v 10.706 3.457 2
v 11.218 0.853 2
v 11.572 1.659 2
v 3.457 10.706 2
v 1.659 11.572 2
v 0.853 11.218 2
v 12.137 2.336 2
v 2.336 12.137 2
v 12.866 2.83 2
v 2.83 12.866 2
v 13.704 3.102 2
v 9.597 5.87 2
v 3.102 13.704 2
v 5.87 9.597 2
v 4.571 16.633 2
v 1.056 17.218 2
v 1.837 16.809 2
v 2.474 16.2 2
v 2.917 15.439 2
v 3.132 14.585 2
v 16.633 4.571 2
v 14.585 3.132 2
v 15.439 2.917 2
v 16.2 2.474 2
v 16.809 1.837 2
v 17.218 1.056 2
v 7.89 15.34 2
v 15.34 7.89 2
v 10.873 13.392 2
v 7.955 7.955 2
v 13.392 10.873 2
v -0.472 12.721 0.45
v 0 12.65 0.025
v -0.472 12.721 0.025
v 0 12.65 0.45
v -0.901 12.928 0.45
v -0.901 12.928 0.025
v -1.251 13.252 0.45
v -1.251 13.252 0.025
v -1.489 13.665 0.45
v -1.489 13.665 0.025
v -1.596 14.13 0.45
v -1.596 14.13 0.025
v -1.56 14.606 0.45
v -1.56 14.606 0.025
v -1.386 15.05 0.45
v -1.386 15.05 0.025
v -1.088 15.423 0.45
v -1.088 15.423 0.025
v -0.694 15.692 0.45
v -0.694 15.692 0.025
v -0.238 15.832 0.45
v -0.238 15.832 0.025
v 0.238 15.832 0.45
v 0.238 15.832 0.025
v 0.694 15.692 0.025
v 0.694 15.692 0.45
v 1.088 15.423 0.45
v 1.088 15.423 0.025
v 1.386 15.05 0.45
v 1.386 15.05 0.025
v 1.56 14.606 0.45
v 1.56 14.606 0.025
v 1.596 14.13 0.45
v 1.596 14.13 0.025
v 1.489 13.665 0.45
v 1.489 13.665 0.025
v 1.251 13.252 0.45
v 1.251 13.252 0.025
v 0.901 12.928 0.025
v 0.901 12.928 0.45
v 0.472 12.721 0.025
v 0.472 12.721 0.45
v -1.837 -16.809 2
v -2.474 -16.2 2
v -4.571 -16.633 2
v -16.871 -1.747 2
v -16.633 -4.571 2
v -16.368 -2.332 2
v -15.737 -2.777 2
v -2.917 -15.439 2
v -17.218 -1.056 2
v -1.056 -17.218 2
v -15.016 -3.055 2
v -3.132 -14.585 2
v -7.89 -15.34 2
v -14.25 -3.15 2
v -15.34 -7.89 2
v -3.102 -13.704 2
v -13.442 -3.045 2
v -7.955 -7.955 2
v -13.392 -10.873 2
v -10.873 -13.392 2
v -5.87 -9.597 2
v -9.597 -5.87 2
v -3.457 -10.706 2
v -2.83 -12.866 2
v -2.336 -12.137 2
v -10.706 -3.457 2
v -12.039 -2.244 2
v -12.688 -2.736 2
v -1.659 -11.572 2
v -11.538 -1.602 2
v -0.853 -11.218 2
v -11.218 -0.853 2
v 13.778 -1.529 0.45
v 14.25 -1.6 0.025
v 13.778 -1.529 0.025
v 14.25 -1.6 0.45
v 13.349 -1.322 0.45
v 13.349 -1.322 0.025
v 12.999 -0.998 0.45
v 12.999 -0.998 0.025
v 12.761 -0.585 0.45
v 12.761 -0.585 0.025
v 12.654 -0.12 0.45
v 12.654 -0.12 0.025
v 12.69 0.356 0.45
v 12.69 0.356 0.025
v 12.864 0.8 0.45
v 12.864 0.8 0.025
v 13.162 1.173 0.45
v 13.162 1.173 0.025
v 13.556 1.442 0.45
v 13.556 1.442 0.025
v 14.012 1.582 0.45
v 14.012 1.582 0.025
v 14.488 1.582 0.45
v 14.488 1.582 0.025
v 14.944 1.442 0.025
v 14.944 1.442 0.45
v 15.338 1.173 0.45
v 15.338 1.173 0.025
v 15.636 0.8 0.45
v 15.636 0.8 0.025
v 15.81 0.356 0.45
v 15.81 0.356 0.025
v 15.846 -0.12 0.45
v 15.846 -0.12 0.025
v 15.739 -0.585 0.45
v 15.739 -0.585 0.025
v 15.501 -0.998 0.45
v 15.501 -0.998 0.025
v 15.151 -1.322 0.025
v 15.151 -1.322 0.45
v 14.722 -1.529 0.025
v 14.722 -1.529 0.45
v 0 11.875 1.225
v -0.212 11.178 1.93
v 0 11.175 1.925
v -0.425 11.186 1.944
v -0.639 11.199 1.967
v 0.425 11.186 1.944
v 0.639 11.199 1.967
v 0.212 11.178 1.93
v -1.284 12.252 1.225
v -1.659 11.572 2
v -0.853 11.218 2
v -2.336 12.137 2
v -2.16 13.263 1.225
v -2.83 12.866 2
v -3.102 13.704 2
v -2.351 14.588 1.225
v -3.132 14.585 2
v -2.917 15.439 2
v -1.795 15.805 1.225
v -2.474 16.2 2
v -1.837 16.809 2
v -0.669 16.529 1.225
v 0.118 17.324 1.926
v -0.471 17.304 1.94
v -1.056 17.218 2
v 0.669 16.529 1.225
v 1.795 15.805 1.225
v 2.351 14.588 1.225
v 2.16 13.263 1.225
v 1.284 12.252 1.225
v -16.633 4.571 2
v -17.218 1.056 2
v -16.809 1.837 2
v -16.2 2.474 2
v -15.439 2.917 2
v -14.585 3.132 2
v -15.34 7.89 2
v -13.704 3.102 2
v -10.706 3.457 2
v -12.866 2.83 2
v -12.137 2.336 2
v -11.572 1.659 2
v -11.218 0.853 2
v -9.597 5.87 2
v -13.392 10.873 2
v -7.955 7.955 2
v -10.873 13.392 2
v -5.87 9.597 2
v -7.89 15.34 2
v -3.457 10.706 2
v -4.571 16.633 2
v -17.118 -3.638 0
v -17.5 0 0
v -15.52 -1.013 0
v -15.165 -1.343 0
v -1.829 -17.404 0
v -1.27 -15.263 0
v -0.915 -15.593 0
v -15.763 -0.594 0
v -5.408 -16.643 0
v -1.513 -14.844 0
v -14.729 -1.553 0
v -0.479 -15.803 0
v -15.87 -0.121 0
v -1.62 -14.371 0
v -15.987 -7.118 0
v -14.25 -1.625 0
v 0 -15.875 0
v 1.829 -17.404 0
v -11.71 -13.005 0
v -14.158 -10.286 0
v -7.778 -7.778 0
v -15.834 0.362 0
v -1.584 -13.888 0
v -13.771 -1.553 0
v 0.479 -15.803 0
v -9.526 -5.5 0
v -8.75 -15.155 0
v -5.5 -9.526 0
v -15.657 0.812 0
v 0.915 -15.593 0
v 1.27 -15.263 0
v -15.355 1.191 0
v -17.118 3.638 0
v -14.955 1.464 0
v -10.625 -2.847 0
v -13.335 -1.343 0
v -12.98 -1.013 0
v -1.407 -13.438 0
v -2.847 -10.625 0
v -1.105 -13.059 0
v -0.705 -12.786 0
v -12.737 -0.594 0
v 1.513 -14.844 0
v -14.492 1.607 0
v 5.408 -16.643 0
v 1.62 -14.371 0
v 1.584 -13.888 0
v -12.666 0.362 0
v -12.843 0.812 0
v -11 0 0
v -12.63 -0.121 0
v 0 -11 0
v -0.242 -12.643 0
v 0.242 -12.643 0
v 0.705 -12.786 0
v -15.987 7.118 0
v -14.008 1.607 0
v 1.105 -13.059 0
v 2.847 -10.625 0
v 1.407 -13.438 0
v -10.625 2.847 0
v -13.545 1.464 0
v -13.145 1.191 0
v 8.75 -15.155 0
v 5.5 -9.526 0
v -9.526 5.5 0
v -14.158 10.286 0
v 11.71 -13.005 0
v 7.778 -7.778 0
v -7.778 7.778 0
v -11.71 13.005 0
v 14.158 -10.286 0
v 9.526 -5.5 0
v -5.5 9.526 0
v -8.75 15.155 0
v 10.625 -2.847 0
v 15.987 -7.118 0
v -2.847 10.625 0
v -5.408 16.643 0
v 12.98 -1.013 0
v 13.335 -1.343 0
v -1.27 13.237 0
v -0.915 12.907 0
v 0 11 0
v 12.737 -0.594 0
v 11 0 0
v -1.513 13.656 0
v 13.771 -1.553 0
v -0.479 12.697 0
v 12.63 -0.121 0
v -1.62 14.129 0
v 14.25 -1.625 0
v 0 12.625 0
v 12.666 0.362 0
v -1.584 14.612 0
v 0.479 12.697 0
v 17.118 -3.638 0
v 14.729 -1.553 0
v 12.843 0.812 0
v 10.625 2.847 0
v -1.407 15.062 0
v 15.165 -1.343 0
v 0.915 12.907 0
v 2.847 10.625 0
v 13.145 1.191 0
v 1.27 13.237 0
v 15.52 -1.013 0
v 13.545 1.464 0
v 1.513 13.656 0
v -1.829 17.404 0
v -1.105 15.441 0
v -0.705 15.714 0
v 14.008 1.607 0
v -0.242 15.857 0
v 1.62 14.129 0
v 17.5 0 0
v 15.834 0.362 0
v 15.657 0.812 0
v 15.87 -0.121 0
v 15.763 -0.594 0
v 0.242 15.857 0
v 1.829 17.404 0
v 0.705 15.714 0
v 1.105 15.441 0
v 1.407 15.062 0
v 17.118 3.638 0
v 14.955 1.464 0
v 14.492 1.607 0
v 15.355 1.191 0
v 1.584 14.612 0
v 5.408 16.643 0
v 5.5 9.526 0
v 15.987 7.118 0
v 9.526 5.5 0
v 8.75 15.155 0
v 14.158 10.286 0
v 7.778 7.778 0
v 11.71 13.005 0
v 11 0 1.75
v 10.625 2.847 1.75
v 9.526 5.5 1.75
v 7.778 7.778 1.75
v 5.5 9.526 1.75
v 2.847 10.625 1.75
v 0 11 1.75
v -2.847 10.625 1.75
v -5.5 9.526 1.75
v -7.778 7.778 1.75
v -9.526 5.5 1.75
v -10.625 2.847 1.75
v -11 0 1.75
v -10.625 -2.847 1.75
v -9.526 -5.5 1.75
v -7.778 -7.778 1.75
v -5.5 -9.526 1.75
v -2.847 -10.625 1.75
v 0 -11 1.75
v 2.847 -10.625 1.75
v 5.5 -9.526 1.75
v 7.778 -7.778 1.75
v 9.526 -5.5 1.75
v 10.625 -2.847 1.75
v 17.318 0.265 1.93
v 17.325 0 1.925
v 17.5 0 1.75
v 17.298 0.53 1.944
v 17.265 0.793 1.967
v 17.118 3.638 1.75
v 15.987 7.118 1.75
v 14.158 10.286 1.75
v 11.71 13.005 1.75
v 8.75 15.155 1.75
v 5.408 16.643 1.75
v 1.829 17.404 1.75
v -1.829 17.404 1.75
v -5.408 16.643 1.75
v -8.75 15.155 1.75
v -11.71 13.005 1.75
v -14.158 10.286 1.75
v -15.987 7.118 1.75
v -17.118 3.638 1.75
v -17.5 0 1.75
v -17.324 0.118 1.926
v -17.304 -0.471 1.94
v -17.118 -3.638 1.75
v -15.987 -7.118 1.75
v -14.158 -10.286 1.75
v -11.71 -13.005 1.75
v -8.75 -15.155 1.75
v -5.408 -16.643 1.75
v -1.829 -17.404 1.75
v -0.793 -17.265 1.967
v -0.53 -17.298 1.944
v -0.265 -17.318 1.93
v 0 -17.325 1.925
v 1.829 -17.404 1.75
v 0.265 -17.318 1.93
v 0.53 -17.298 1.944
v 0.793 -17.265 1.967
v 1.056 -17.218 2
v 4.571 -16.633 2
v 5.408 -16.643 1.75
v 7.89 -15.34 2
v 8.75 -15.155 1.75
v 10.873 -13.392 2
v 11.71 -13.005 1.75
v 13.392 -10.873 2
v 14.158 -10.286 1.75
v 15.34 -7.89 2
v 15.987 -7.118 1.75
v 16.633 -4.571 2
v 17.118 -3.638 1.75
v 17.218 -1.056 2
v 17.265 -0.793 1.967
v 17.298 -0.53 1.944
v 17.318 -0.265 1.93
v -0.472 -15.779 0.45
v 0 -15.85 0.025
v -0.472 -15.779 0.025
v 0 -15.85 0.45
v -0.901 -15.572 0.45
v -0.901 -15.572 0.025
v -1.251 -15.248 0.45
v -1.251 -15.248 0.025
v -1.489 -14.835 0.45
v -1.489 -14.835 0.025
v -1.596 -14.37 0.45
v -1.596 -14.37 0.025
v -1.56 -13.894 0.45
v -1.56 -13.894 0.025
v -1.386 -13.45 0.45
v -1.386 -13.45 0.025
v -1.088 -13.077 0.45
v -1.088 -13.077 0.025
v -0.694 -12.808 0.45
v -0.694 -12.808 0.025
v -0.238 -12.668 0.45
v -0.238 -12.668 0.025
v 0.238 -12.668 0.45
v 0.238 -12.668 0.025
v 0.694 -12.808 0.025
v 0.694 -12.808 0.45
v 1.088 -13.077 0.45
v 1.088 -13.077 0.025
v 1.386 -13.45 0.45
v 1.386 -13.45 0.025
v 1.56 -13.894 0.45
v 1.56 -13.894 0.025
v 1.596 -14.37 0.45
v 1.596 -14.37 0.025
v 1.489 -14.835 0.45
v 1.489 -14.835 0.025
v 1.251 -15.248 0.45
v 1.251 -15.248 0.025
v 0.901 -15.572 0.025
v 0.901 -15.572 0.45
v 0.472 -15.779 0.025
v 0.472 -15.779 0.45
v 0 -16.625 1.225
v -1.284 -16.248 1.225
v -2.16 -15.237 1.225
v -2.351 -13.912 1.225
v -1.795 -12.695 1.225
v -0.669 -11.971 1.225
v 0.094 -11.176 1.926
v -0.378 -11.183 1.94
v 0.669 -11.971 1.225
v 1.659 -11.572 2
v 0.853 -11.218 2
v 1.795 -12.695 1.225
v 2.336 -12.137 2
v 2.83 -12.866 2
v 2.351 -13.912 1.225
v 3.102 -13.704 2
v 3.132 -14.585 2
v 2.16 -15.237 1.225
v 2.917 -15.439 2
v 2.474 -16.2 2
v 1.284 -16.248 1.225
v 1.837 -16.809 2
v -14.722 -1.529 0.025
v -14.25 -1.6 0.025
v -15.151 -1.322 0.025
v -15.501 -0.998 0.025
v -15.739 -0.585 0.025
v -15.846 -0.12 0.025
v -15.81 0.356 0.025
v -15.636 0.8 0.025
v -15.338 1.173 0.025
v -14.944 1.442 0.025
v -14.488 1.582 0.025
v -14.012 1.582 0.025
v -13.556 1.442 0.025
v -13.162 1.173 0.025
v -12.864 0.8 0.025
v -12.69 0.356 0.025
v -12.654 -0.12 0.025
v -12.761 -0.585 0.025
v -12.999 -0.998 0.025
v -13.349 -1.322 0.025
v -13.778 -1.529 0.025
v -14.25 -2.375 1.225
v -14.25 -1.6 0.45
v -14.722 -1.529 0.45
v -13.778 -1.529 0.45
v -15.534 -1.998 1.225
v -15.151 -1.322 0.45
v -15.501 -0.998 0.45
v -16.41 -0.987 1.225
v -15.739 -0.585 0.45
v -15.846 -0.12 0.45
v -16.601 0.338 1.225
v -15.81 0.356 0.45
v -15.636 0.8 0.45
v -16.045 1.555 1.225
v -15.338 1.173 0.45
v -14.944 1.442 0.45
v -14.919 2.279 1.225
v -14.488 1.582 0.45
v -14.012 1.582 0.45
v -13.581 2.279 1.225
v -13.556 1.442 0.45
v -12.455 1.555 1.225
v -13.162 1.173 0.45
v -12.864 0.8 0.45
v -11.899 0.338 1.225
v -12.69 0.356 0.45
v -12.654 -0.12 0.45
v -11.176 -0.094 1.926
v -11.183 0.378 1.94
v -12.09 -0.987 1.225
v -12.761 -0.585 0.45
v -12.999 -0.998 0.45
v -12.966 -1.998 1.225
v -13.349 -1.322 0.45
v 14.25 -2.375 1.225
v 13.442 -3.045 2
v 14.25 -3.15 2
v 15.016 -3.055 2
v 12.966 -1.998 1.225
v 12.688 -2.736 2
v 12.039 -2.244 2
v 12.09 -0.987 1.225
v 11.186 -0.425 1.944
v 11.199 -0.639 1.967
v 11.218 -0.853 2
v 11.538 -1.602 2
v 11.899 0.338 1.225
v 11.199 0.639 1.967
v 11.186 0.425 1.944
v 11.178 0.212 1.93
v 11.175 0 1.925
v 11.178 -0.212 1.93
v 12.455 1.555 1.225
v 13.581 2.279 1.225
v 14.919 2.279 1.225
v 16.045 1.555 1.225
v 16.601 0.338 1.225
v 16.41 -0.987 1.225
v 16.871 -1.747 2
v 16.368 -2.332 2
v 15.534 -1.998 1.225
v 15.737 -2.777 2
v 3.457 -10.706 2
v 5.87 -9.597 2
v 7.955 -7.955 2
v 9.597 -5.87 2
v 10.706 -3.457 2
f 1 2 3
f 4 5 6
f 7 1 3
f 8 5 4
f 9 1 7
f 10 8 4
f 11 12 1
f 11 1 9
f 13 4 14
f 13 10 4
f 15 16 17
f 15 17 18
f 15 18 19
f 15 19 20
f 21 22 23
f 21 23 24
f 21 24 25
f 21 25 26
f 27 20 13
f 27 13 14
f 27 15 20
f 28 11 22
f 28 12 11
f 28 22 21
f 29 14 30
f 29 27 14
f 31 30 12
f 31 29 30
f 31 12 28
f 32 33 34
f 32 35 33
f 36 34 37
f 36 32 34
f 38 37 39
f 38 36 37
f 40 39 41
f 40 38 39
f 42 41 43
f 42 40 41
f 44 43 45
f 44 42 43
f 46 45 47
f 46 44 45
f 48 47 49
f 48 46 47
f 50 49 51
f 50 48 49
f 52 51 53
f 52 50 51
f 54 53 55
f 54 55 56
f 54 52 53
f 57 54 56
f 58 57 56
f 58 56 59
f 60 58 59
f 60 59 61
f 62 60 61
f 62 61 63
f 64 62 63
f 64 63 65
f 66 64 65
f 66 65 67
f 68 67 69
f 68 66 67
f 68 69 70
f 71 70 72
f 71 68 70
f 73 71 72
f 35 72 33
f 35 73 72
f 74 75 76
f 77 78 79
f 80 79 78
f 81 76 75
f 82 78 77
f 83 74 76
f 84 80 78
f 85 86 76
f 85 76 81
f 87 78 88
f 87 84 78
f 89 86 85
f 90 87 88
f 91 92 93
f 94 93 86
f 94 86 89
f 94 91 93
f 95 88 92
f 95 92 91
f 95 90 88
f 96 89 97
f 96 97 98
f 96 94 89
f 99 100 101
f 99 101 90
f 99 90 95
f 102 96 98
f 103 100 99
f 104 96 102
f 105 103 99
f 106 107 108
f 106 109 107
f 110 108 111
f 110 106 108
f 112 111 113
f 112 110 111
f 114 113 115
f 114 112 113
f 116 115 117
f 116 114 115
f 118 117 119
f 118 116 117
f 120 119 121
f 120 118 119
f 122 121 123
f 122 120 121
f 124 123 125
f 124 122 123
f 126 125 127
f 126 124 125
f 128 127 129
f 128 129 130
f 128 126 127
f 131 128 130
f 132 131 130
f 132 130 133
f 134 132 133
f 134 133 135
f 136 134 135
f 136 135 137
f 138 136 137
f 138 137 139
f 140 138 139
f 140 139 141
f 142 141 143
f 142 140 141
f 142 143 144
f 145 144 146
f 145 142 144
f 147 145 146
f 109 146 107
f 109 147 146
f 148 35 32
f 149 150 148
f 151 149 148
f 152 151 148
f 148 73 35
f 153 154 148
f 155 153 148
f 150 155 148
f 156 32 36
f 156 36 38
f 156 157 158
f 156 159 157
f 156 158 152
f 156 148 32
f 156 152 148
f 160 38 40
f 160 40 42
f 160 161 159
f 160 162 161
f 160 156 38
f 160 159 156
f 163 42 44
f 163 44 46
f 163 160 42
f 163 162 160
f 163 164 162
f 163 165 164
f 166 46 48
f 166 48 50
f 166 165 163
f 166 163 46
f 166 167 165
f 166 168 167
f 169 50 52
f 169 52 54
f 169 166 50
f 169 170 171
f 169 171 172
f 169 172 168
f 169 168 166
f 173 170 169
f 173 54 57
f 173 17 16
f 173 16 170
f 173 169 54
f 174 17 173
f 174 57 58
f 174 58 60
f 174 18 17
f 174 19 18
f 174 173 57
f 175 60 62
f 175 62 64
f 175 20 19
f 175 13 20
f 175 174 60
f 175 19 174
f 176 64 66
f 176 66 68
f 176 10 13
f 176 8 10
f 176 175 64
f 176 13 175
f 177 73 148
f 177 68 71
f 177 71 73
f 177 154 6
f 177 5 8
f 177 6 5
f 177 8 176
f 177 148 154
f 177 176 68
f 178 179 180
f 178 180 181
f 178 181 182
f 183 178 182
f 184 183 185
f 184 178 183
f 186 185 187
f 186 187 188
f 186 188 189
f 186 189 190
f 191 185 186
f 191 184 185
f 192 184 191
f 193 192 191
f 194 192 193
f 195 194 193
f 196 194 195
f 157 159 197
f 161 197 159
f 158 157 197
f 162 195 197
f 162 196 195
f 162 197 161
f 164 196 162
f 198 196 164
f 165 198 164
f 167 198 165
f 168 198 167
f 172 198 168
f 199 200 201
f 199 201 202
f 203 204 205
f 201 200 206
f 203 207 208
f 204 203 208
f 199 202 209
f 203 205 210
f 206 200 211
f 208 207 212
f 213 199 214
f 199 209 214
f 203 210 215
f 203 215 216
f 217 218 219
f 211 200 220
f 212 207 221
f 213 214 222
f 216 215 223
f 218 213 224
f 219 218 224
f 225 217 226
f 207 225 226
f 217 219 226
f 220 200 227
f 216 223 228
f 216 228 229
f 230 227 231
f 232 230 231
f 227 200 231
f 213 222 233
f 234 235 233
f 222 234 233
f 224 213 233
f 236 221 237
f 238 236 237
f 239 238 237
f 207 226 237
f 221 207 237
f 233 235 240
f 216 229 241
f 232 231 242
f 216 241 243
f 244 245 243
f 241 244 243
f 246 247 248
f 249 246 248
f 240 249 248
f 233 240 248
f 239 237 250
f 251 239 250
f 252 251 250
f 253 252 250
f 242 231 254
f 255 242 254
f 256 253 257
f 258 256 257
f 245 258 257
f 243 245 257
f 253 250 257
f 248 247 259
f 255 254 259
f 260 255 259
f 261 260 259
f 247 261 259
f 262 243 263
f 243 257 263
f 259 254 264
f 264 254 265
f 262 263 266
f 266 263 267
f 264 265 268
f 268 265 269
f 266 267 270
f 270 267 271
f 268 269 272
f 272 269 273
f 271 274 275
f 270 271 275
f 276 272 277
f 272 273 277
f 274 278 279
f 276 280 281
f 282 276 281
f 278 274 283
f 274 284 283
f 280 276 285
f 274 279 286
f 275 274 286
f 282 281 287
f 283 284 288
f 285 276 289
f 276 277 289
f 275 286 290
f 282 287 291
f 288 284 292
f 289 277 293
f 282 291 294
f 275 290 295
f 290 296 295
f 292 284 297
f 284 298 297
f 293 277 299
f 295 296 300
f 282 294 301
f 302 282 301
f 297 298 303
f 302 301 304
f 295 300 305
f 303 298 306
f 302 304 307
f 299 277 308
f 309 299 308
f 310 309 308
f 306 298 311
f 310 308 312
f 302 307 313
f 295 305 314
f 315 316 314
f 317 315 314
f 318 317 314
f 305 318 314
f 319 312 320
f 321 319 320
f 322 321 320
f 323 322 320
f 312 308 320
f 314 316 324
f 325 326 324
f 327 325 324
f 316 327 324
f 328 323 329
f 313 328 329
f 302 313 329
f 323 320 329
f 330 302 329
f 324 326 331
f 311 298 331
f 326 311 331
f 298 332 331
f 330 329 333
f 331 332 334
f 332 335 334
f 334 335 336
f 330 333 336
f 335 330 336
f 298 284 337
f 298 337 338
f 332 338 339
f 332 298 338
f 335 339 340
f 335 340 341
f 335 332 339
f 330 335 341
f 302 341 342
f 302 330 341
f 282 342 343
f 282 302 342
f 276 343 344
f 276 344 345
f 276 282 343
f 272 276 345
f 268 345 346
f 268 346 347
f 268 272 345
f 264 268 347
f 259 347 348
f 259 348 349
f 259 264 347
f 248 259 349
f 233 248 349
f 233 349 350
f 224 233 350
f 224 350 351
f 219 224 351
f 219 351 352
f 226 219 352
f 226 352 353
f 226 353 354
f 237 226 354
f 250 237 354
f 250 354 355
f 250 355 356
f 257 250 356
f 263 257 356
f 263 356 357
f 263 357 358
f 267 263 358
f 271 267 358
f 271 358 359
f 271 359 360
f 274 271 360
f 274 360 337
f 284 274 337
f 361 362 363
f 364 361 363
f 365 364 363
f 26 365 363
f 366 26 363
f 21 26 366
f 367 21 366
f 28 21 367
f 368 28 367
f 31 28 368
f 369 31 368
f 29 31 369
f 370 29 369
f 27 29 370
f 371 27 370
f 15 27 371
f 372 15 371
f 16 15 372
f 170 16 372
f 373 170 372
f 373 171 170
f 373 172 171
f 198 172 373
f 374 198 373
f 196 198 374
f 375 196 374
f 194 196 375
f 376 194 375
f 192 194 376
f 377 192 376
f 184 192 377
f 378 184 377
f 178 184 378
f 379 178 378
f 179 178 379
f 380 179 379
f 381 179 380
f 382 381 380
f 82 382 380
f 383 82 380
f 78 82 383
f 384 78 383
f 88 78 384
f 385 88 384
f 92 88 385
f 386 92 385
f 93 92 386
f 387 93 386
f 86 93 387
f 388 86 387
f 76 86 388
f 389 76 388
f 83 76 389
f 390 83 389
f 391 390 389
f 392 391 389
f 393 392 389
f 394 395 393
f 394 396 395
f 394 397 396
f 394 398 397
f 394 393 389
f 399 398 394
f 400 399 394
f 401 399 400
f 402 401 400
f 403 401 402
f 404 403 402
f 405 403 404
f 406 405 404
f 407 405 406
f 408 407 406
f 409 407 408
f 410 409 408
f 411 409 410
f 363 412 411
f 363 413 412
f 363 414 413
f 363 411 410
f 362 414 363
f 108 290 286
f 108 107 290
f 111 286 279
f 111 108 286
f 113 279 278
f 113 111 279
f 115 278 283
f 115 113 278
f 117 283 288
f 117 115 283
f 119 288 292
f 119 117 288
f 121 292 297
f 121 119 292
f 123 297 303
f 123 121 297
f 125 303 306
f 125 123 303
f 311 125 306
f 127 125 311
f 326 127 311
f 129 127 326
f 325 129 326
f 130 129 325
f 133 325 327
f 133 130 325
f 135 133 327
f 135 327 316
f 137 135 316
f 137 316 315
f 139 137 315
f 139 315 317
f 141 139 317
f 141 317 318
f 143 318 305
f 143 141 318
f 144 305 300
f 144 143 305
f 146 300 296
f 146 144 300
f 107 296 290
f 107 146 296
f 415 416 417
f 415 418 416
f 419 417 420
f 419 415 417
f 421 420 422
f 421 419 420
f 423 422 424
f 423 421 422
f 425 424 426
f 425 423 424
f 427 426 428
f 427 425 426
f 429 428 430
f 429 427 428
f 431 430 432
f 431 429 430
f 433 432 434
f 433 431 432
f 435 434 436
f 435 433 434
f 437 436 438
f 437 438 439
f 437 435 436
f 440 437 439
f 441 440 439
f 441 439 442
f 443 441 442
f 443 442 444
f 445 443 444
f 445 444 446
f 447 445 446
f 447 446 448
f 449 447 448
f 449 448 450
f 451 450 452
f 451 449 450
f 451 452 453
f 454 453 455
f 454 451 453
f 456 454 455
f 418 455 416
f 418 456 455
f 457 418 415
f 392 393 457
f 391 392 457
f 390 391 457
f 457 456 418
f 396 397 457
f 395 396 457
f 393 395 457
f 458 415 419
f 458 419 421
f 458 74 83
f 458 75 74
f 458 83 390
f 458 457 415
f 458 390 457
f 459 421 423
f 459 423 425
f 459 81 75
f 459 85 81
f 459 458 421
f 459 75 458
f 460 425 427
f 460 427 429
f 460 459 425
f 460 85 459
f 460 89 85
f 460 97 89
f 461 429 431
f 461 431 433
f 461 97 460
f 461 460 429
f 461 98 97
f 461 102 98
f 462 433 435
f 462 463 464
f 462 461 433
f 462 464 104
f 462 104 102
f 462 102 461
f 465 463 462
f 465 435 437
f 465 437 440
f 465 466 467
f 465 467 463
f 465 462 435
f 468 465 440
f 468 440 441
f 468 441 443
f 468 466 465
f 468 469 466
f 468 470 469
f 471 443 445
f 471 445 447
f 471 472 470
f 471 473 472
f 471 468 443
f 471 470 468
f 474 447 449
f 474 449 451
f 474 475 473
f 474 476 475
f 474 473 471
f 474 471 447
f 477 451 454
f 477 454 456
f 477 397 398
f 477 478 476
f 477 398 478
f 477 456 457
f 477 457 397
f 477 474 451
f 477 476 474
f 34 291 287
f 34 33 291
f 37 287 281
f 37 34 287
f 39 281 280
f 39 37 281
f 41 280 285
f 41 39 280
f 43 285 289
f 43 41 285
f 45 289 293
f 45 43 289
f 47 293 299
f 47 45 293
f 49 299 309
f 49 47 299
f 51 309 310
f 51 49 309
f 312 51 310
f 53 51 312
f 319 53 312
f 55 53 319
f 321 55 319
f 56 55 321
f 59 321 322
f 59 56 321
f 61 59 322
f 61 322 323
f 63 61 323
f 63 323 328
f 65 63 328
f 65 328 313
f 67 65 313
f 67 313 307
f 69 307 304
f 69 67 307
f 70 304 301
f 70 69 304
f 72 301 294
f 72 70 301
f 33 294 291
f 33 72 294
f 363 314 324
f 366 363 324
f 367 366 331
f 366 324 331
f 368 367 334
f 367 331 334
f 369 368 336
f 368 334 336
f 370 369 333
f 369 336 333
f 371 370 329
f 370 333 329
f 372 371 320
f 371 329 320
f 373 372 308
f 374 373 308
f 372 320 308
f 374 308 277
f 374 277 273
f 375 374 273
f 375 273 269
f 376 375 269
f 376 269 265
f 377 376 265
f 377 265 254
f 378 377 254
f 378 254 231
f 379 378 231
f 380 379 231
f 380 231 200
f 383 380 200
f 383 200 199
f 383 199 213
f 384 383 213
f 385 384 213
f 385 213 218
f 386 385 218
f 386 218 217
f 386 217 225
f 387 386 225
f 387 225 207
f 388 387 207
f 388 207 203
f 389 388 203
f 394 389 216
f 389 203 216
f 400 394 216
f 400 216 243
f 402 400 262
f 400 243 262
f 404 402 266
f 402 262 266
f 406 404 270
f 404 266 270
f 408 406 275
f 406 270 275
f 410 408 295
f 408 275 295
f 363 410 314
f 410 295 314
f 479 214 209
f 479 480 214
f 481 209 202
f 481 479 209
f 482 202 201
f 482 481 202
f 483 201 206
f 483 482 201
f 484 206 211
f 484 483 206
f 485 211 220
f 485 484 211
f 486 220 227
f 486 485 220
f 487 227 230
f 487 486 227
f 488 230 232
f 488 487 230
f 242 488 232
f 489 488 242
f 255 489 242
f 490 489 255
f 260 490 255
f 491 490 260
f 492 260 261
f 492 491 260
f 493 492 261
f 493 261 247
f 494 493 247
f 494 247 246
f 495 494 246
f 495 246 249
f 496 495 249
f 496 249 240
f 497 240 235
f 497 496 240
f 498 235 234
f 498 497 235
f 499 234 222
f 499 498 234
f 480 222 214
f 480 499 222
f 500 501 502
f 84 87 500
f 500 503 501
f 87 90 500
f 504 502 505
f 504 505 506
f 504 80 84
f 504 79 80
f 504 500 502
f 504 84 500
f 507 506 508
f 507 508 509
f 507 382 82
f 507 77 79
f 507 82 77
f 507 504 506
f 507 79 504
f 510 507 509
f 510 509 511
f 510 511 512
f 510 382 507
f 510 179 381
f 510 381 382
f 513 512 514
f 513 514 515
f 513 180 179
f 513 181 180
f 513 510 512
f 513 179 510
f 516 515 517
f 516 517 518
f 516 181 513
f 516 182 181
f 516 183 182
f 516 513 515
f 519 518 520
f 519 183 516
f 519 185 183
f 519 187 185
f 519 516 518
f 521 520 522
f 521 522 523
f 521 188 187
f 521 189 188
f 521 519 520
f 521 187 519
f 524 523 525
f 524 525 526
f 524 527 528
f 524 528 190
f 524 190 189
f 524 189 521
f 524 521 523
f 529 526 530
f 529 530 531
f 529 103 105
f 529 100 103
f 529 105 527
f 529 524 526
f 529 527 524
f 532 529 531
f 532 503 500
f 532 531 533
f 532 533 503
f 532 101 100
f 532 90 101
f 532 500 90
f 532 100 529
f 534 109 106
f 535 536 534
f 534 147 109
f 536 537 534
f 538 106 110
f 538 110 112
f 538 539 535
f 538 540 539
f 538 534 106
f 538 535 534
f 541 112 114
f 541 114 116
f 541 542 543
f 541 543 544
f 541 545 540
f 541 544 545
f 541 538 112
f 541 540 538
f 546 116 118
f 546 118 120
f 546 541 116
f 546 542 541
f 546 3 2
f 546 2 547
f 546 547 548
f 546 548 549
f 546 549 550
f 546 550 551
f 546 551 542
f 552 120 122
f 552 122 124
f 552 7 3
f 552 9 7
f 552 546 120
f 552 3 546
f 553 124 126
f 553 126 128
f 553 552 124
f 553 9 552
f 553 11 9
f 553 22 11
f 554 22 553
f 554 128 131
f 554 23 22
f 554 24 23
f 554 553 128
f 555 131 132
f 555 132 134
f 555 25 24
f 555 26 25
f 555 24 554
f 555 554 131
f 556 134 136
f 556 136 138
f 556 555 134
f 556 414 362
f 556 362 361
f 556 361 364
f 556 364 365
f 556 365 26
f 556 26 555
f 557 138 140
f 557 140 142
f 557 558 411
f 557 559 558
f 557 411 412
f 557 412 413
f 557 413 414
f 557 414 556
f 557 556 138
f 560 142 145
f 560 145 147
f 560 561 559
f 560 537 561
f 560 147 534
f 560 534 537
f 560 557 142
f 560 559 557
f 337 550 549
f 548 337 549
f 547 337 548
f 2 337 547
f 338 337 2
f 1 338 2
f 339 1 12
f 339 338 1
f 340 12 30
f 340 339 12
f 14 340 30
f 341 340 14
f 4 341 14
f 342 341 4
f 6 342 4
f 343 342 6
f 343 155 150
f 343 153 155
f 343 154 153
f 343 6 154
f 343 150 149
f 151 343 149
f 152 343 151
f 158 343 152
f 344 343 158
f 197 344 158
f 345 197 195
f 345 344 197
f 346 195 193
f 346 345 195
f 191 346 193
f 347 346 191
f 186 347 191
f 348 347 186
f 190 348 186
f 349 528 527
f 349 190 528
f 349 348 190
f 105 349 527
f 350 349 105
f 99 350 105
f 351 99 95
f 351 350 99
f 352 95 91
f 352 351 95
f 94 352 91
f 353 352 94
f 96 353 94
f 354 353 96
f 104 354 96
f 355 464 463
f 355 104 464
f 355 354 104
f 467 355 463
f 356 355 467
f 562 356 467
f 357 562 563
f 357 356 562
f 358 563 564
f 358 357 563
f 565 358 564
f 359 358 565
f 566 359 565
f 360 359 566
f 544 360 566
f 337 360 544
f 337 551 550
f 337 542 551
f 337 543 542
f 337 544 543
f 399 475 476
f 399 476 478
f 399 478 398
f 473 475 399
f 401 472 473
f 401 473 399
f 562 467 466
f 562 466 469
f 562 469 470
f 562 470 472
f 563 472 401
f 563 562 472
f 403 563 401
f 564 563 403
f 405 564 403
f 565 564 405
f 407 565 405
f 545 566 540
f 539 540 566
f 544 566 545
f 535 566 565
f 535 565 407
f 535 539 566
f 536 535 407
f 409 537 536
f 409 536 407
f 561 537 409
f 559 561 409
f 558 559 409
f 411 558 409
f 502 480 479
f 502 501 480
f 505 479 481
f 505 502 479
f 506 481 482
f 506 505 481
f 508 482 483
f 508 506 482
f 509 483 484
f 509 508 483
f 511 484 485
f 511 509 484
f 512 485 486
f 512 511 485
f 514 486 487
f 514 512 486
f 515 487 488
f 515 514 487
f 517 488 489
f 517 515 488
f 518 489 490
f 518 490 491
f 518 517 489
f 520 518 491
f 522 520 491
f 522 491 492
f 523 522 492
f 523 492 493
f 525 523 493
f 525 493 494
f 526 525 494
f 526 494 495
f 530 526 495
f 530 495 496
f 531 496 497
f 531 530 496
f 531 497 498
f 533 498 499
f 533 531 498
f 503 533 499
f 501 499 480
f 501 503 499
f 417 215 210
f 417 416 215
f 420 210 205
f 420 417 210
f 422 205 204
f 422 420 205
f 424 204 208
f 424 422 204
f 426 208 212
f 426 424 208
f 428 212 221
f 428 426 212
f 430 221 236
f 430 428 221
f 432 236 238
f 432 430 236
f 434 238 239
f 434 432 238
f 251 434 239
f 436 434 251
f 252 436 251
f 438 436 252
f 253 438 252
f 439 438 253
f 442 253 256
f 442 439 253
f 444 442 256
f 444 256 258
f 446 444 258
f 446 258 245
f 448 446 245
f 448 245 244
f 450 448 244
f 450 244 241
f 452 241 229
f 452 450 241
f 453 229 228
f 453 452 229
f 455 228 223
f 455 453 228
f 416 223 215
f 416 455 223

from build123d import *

# Parameters (mm, degrees)
SKETCH_1_R                  = 17.5
SKETCH_1_R_2                = 11
EXTRUDE_1_DEPTH             = 2
HOLE_WIZARD_M3_1_AT_2_COUNT = 2
HOLE_WIZARD_M3_1_AT_2_PITCH = 20.152543264
HOLE_WIZARD_M3_1_AT_3_COUNT = 2
HOLE_WIZARD_M3_1_AT_3_PITCH = 28.5
HOLE_WIZARD_M3_1_AT_4_COUNT = 2
HOLE_WIZARD_M3_1_AT_4_PITCH = 20.152543264
HOLE_WIZARD_M3_1_AT_5_COUNT = 2
HOLE_WIZARD_M3_1_AT_5_PITCH = 14.25
CHAMFER_1_SIZE              = 0.25


with BuildPart() as part:
    # ｽｹｯﾁ1 → ﾎﾞｽ - 押し出し1 (new body)
    with BuildSketch(Plane.XY):
        Circle(SKETCH_1_R)
        Circle(SKETCH_1_R_2, mode=Mode.SUBTRACT)
    extrude(amount=EXTRUDE_1_DEPTH)

    # ｽｹｯﾁ4 → M3 丸皿ねじ用皿穴1 (revolve, cut)
    with BuildSketch(Plane(origin=(0, 14.25, 2), x_dir=(0, -1, 0), z_dir=(1, 0, 0))):
        Polygon((0, 0), (0, 2), (1.625, 2), (1.6, 1.975), (1.6, 1.55), (3.15, 0), align=None)
    hole_wizard_m3_1 = revolve(axis=Axis((0, 14.25, 8.35), (0, 0, -1)), mode=Mode.SUBTRACT)

    # M3 丸皿ねじ用皿穴1 at 2: M3 丸皿ねじ用皿穴1 ×2
    with Locations(*[Vector(0.7071067811865476, -0.7071067811865476, 0) * (i * HOLE_WIZARD_M3_1_AT_2_PITCH) for i in range(1, HOLE_WIZARD_M3_1_AT_2_COUNT)]):
        add(hole_wizard_m3_1, mode=Mode.SUBTRACT)

    # M3 丸皿ねじ用皿穴1 at 3: M3 丸皿ねじ用皿穴1 ×2
    with Locations(*[(0, -i * HOLE_WIZARD_M3_1_AT_3_PITCH, 0) for i in range(1, HOLE_WIZARD_M3_1_AT_3_COUNT)]):
        add(hole_wizard_m3_1, mode=Mode.SUBTRACT)

    # M3 丸皿ねじ用皿穴1 at 4: M3 丸皿ねじ用皿穴1 ×2
    with Locations(*[Vector(-0.7071067811865476, -0.7071067811865476, 0) * (i * HOLE_WIZARD_M3_1_AT_4_PITCH) for i in range(1, HOLE_WIZARD_M3_1_AT_4_COUNT)]):
        add(hole_wizard_m3_1, mode=Mode.SUBTRACT)

    # M3 丸皿ねじ用皿穴1 at 5: M3 丸皿ねじ用皿穴1 ×2
    with Locations(*[(0, -i * HOLE_WIZARD_M3_1_AT_5_PITCH, 0) for i in range(1, HOLE_WIZARD_M3_1_AT_5_COUNT)]):
        add(hole_wizard_m3_1, mode=Mode.SUBTRACT)

    # 面取り1
    # the kernel refuses this chamfer: 0.25 mm, written as the material it takes off along each edge
    with BuildSketch(Plane(origin=(0, 0, 2), x_dir=(1, 0, 0), z_dir=(0, -1, 0))) as chamfer_1_piece_1:
        Polygon((17.5, -CHAMFER_1_SIZE), (17.5 - CHAMFER_1_SIZE, 0), (17.5, 0), align=None)
    revolve(axis=Axis((0, 0, 2), (0, 0, 1)), mode=Mode.SUBTRACT)
    with BuildSketch(Plane(origin=(0, 0, 2), x_dir=(1, 0, 0), z_dir=(0, -1, 0))) as chamfer_1_piece_2:
        Polygon((11 + CHAMFER_1_SIZE, 0), (11, -CHAMFER_1_SIZE), (11, 0), align=None)
    revolve(axis=Axis((0, 0, 2), (0, 0, 1)), mode=Mode.SUBTRACT)


solid = part.part
